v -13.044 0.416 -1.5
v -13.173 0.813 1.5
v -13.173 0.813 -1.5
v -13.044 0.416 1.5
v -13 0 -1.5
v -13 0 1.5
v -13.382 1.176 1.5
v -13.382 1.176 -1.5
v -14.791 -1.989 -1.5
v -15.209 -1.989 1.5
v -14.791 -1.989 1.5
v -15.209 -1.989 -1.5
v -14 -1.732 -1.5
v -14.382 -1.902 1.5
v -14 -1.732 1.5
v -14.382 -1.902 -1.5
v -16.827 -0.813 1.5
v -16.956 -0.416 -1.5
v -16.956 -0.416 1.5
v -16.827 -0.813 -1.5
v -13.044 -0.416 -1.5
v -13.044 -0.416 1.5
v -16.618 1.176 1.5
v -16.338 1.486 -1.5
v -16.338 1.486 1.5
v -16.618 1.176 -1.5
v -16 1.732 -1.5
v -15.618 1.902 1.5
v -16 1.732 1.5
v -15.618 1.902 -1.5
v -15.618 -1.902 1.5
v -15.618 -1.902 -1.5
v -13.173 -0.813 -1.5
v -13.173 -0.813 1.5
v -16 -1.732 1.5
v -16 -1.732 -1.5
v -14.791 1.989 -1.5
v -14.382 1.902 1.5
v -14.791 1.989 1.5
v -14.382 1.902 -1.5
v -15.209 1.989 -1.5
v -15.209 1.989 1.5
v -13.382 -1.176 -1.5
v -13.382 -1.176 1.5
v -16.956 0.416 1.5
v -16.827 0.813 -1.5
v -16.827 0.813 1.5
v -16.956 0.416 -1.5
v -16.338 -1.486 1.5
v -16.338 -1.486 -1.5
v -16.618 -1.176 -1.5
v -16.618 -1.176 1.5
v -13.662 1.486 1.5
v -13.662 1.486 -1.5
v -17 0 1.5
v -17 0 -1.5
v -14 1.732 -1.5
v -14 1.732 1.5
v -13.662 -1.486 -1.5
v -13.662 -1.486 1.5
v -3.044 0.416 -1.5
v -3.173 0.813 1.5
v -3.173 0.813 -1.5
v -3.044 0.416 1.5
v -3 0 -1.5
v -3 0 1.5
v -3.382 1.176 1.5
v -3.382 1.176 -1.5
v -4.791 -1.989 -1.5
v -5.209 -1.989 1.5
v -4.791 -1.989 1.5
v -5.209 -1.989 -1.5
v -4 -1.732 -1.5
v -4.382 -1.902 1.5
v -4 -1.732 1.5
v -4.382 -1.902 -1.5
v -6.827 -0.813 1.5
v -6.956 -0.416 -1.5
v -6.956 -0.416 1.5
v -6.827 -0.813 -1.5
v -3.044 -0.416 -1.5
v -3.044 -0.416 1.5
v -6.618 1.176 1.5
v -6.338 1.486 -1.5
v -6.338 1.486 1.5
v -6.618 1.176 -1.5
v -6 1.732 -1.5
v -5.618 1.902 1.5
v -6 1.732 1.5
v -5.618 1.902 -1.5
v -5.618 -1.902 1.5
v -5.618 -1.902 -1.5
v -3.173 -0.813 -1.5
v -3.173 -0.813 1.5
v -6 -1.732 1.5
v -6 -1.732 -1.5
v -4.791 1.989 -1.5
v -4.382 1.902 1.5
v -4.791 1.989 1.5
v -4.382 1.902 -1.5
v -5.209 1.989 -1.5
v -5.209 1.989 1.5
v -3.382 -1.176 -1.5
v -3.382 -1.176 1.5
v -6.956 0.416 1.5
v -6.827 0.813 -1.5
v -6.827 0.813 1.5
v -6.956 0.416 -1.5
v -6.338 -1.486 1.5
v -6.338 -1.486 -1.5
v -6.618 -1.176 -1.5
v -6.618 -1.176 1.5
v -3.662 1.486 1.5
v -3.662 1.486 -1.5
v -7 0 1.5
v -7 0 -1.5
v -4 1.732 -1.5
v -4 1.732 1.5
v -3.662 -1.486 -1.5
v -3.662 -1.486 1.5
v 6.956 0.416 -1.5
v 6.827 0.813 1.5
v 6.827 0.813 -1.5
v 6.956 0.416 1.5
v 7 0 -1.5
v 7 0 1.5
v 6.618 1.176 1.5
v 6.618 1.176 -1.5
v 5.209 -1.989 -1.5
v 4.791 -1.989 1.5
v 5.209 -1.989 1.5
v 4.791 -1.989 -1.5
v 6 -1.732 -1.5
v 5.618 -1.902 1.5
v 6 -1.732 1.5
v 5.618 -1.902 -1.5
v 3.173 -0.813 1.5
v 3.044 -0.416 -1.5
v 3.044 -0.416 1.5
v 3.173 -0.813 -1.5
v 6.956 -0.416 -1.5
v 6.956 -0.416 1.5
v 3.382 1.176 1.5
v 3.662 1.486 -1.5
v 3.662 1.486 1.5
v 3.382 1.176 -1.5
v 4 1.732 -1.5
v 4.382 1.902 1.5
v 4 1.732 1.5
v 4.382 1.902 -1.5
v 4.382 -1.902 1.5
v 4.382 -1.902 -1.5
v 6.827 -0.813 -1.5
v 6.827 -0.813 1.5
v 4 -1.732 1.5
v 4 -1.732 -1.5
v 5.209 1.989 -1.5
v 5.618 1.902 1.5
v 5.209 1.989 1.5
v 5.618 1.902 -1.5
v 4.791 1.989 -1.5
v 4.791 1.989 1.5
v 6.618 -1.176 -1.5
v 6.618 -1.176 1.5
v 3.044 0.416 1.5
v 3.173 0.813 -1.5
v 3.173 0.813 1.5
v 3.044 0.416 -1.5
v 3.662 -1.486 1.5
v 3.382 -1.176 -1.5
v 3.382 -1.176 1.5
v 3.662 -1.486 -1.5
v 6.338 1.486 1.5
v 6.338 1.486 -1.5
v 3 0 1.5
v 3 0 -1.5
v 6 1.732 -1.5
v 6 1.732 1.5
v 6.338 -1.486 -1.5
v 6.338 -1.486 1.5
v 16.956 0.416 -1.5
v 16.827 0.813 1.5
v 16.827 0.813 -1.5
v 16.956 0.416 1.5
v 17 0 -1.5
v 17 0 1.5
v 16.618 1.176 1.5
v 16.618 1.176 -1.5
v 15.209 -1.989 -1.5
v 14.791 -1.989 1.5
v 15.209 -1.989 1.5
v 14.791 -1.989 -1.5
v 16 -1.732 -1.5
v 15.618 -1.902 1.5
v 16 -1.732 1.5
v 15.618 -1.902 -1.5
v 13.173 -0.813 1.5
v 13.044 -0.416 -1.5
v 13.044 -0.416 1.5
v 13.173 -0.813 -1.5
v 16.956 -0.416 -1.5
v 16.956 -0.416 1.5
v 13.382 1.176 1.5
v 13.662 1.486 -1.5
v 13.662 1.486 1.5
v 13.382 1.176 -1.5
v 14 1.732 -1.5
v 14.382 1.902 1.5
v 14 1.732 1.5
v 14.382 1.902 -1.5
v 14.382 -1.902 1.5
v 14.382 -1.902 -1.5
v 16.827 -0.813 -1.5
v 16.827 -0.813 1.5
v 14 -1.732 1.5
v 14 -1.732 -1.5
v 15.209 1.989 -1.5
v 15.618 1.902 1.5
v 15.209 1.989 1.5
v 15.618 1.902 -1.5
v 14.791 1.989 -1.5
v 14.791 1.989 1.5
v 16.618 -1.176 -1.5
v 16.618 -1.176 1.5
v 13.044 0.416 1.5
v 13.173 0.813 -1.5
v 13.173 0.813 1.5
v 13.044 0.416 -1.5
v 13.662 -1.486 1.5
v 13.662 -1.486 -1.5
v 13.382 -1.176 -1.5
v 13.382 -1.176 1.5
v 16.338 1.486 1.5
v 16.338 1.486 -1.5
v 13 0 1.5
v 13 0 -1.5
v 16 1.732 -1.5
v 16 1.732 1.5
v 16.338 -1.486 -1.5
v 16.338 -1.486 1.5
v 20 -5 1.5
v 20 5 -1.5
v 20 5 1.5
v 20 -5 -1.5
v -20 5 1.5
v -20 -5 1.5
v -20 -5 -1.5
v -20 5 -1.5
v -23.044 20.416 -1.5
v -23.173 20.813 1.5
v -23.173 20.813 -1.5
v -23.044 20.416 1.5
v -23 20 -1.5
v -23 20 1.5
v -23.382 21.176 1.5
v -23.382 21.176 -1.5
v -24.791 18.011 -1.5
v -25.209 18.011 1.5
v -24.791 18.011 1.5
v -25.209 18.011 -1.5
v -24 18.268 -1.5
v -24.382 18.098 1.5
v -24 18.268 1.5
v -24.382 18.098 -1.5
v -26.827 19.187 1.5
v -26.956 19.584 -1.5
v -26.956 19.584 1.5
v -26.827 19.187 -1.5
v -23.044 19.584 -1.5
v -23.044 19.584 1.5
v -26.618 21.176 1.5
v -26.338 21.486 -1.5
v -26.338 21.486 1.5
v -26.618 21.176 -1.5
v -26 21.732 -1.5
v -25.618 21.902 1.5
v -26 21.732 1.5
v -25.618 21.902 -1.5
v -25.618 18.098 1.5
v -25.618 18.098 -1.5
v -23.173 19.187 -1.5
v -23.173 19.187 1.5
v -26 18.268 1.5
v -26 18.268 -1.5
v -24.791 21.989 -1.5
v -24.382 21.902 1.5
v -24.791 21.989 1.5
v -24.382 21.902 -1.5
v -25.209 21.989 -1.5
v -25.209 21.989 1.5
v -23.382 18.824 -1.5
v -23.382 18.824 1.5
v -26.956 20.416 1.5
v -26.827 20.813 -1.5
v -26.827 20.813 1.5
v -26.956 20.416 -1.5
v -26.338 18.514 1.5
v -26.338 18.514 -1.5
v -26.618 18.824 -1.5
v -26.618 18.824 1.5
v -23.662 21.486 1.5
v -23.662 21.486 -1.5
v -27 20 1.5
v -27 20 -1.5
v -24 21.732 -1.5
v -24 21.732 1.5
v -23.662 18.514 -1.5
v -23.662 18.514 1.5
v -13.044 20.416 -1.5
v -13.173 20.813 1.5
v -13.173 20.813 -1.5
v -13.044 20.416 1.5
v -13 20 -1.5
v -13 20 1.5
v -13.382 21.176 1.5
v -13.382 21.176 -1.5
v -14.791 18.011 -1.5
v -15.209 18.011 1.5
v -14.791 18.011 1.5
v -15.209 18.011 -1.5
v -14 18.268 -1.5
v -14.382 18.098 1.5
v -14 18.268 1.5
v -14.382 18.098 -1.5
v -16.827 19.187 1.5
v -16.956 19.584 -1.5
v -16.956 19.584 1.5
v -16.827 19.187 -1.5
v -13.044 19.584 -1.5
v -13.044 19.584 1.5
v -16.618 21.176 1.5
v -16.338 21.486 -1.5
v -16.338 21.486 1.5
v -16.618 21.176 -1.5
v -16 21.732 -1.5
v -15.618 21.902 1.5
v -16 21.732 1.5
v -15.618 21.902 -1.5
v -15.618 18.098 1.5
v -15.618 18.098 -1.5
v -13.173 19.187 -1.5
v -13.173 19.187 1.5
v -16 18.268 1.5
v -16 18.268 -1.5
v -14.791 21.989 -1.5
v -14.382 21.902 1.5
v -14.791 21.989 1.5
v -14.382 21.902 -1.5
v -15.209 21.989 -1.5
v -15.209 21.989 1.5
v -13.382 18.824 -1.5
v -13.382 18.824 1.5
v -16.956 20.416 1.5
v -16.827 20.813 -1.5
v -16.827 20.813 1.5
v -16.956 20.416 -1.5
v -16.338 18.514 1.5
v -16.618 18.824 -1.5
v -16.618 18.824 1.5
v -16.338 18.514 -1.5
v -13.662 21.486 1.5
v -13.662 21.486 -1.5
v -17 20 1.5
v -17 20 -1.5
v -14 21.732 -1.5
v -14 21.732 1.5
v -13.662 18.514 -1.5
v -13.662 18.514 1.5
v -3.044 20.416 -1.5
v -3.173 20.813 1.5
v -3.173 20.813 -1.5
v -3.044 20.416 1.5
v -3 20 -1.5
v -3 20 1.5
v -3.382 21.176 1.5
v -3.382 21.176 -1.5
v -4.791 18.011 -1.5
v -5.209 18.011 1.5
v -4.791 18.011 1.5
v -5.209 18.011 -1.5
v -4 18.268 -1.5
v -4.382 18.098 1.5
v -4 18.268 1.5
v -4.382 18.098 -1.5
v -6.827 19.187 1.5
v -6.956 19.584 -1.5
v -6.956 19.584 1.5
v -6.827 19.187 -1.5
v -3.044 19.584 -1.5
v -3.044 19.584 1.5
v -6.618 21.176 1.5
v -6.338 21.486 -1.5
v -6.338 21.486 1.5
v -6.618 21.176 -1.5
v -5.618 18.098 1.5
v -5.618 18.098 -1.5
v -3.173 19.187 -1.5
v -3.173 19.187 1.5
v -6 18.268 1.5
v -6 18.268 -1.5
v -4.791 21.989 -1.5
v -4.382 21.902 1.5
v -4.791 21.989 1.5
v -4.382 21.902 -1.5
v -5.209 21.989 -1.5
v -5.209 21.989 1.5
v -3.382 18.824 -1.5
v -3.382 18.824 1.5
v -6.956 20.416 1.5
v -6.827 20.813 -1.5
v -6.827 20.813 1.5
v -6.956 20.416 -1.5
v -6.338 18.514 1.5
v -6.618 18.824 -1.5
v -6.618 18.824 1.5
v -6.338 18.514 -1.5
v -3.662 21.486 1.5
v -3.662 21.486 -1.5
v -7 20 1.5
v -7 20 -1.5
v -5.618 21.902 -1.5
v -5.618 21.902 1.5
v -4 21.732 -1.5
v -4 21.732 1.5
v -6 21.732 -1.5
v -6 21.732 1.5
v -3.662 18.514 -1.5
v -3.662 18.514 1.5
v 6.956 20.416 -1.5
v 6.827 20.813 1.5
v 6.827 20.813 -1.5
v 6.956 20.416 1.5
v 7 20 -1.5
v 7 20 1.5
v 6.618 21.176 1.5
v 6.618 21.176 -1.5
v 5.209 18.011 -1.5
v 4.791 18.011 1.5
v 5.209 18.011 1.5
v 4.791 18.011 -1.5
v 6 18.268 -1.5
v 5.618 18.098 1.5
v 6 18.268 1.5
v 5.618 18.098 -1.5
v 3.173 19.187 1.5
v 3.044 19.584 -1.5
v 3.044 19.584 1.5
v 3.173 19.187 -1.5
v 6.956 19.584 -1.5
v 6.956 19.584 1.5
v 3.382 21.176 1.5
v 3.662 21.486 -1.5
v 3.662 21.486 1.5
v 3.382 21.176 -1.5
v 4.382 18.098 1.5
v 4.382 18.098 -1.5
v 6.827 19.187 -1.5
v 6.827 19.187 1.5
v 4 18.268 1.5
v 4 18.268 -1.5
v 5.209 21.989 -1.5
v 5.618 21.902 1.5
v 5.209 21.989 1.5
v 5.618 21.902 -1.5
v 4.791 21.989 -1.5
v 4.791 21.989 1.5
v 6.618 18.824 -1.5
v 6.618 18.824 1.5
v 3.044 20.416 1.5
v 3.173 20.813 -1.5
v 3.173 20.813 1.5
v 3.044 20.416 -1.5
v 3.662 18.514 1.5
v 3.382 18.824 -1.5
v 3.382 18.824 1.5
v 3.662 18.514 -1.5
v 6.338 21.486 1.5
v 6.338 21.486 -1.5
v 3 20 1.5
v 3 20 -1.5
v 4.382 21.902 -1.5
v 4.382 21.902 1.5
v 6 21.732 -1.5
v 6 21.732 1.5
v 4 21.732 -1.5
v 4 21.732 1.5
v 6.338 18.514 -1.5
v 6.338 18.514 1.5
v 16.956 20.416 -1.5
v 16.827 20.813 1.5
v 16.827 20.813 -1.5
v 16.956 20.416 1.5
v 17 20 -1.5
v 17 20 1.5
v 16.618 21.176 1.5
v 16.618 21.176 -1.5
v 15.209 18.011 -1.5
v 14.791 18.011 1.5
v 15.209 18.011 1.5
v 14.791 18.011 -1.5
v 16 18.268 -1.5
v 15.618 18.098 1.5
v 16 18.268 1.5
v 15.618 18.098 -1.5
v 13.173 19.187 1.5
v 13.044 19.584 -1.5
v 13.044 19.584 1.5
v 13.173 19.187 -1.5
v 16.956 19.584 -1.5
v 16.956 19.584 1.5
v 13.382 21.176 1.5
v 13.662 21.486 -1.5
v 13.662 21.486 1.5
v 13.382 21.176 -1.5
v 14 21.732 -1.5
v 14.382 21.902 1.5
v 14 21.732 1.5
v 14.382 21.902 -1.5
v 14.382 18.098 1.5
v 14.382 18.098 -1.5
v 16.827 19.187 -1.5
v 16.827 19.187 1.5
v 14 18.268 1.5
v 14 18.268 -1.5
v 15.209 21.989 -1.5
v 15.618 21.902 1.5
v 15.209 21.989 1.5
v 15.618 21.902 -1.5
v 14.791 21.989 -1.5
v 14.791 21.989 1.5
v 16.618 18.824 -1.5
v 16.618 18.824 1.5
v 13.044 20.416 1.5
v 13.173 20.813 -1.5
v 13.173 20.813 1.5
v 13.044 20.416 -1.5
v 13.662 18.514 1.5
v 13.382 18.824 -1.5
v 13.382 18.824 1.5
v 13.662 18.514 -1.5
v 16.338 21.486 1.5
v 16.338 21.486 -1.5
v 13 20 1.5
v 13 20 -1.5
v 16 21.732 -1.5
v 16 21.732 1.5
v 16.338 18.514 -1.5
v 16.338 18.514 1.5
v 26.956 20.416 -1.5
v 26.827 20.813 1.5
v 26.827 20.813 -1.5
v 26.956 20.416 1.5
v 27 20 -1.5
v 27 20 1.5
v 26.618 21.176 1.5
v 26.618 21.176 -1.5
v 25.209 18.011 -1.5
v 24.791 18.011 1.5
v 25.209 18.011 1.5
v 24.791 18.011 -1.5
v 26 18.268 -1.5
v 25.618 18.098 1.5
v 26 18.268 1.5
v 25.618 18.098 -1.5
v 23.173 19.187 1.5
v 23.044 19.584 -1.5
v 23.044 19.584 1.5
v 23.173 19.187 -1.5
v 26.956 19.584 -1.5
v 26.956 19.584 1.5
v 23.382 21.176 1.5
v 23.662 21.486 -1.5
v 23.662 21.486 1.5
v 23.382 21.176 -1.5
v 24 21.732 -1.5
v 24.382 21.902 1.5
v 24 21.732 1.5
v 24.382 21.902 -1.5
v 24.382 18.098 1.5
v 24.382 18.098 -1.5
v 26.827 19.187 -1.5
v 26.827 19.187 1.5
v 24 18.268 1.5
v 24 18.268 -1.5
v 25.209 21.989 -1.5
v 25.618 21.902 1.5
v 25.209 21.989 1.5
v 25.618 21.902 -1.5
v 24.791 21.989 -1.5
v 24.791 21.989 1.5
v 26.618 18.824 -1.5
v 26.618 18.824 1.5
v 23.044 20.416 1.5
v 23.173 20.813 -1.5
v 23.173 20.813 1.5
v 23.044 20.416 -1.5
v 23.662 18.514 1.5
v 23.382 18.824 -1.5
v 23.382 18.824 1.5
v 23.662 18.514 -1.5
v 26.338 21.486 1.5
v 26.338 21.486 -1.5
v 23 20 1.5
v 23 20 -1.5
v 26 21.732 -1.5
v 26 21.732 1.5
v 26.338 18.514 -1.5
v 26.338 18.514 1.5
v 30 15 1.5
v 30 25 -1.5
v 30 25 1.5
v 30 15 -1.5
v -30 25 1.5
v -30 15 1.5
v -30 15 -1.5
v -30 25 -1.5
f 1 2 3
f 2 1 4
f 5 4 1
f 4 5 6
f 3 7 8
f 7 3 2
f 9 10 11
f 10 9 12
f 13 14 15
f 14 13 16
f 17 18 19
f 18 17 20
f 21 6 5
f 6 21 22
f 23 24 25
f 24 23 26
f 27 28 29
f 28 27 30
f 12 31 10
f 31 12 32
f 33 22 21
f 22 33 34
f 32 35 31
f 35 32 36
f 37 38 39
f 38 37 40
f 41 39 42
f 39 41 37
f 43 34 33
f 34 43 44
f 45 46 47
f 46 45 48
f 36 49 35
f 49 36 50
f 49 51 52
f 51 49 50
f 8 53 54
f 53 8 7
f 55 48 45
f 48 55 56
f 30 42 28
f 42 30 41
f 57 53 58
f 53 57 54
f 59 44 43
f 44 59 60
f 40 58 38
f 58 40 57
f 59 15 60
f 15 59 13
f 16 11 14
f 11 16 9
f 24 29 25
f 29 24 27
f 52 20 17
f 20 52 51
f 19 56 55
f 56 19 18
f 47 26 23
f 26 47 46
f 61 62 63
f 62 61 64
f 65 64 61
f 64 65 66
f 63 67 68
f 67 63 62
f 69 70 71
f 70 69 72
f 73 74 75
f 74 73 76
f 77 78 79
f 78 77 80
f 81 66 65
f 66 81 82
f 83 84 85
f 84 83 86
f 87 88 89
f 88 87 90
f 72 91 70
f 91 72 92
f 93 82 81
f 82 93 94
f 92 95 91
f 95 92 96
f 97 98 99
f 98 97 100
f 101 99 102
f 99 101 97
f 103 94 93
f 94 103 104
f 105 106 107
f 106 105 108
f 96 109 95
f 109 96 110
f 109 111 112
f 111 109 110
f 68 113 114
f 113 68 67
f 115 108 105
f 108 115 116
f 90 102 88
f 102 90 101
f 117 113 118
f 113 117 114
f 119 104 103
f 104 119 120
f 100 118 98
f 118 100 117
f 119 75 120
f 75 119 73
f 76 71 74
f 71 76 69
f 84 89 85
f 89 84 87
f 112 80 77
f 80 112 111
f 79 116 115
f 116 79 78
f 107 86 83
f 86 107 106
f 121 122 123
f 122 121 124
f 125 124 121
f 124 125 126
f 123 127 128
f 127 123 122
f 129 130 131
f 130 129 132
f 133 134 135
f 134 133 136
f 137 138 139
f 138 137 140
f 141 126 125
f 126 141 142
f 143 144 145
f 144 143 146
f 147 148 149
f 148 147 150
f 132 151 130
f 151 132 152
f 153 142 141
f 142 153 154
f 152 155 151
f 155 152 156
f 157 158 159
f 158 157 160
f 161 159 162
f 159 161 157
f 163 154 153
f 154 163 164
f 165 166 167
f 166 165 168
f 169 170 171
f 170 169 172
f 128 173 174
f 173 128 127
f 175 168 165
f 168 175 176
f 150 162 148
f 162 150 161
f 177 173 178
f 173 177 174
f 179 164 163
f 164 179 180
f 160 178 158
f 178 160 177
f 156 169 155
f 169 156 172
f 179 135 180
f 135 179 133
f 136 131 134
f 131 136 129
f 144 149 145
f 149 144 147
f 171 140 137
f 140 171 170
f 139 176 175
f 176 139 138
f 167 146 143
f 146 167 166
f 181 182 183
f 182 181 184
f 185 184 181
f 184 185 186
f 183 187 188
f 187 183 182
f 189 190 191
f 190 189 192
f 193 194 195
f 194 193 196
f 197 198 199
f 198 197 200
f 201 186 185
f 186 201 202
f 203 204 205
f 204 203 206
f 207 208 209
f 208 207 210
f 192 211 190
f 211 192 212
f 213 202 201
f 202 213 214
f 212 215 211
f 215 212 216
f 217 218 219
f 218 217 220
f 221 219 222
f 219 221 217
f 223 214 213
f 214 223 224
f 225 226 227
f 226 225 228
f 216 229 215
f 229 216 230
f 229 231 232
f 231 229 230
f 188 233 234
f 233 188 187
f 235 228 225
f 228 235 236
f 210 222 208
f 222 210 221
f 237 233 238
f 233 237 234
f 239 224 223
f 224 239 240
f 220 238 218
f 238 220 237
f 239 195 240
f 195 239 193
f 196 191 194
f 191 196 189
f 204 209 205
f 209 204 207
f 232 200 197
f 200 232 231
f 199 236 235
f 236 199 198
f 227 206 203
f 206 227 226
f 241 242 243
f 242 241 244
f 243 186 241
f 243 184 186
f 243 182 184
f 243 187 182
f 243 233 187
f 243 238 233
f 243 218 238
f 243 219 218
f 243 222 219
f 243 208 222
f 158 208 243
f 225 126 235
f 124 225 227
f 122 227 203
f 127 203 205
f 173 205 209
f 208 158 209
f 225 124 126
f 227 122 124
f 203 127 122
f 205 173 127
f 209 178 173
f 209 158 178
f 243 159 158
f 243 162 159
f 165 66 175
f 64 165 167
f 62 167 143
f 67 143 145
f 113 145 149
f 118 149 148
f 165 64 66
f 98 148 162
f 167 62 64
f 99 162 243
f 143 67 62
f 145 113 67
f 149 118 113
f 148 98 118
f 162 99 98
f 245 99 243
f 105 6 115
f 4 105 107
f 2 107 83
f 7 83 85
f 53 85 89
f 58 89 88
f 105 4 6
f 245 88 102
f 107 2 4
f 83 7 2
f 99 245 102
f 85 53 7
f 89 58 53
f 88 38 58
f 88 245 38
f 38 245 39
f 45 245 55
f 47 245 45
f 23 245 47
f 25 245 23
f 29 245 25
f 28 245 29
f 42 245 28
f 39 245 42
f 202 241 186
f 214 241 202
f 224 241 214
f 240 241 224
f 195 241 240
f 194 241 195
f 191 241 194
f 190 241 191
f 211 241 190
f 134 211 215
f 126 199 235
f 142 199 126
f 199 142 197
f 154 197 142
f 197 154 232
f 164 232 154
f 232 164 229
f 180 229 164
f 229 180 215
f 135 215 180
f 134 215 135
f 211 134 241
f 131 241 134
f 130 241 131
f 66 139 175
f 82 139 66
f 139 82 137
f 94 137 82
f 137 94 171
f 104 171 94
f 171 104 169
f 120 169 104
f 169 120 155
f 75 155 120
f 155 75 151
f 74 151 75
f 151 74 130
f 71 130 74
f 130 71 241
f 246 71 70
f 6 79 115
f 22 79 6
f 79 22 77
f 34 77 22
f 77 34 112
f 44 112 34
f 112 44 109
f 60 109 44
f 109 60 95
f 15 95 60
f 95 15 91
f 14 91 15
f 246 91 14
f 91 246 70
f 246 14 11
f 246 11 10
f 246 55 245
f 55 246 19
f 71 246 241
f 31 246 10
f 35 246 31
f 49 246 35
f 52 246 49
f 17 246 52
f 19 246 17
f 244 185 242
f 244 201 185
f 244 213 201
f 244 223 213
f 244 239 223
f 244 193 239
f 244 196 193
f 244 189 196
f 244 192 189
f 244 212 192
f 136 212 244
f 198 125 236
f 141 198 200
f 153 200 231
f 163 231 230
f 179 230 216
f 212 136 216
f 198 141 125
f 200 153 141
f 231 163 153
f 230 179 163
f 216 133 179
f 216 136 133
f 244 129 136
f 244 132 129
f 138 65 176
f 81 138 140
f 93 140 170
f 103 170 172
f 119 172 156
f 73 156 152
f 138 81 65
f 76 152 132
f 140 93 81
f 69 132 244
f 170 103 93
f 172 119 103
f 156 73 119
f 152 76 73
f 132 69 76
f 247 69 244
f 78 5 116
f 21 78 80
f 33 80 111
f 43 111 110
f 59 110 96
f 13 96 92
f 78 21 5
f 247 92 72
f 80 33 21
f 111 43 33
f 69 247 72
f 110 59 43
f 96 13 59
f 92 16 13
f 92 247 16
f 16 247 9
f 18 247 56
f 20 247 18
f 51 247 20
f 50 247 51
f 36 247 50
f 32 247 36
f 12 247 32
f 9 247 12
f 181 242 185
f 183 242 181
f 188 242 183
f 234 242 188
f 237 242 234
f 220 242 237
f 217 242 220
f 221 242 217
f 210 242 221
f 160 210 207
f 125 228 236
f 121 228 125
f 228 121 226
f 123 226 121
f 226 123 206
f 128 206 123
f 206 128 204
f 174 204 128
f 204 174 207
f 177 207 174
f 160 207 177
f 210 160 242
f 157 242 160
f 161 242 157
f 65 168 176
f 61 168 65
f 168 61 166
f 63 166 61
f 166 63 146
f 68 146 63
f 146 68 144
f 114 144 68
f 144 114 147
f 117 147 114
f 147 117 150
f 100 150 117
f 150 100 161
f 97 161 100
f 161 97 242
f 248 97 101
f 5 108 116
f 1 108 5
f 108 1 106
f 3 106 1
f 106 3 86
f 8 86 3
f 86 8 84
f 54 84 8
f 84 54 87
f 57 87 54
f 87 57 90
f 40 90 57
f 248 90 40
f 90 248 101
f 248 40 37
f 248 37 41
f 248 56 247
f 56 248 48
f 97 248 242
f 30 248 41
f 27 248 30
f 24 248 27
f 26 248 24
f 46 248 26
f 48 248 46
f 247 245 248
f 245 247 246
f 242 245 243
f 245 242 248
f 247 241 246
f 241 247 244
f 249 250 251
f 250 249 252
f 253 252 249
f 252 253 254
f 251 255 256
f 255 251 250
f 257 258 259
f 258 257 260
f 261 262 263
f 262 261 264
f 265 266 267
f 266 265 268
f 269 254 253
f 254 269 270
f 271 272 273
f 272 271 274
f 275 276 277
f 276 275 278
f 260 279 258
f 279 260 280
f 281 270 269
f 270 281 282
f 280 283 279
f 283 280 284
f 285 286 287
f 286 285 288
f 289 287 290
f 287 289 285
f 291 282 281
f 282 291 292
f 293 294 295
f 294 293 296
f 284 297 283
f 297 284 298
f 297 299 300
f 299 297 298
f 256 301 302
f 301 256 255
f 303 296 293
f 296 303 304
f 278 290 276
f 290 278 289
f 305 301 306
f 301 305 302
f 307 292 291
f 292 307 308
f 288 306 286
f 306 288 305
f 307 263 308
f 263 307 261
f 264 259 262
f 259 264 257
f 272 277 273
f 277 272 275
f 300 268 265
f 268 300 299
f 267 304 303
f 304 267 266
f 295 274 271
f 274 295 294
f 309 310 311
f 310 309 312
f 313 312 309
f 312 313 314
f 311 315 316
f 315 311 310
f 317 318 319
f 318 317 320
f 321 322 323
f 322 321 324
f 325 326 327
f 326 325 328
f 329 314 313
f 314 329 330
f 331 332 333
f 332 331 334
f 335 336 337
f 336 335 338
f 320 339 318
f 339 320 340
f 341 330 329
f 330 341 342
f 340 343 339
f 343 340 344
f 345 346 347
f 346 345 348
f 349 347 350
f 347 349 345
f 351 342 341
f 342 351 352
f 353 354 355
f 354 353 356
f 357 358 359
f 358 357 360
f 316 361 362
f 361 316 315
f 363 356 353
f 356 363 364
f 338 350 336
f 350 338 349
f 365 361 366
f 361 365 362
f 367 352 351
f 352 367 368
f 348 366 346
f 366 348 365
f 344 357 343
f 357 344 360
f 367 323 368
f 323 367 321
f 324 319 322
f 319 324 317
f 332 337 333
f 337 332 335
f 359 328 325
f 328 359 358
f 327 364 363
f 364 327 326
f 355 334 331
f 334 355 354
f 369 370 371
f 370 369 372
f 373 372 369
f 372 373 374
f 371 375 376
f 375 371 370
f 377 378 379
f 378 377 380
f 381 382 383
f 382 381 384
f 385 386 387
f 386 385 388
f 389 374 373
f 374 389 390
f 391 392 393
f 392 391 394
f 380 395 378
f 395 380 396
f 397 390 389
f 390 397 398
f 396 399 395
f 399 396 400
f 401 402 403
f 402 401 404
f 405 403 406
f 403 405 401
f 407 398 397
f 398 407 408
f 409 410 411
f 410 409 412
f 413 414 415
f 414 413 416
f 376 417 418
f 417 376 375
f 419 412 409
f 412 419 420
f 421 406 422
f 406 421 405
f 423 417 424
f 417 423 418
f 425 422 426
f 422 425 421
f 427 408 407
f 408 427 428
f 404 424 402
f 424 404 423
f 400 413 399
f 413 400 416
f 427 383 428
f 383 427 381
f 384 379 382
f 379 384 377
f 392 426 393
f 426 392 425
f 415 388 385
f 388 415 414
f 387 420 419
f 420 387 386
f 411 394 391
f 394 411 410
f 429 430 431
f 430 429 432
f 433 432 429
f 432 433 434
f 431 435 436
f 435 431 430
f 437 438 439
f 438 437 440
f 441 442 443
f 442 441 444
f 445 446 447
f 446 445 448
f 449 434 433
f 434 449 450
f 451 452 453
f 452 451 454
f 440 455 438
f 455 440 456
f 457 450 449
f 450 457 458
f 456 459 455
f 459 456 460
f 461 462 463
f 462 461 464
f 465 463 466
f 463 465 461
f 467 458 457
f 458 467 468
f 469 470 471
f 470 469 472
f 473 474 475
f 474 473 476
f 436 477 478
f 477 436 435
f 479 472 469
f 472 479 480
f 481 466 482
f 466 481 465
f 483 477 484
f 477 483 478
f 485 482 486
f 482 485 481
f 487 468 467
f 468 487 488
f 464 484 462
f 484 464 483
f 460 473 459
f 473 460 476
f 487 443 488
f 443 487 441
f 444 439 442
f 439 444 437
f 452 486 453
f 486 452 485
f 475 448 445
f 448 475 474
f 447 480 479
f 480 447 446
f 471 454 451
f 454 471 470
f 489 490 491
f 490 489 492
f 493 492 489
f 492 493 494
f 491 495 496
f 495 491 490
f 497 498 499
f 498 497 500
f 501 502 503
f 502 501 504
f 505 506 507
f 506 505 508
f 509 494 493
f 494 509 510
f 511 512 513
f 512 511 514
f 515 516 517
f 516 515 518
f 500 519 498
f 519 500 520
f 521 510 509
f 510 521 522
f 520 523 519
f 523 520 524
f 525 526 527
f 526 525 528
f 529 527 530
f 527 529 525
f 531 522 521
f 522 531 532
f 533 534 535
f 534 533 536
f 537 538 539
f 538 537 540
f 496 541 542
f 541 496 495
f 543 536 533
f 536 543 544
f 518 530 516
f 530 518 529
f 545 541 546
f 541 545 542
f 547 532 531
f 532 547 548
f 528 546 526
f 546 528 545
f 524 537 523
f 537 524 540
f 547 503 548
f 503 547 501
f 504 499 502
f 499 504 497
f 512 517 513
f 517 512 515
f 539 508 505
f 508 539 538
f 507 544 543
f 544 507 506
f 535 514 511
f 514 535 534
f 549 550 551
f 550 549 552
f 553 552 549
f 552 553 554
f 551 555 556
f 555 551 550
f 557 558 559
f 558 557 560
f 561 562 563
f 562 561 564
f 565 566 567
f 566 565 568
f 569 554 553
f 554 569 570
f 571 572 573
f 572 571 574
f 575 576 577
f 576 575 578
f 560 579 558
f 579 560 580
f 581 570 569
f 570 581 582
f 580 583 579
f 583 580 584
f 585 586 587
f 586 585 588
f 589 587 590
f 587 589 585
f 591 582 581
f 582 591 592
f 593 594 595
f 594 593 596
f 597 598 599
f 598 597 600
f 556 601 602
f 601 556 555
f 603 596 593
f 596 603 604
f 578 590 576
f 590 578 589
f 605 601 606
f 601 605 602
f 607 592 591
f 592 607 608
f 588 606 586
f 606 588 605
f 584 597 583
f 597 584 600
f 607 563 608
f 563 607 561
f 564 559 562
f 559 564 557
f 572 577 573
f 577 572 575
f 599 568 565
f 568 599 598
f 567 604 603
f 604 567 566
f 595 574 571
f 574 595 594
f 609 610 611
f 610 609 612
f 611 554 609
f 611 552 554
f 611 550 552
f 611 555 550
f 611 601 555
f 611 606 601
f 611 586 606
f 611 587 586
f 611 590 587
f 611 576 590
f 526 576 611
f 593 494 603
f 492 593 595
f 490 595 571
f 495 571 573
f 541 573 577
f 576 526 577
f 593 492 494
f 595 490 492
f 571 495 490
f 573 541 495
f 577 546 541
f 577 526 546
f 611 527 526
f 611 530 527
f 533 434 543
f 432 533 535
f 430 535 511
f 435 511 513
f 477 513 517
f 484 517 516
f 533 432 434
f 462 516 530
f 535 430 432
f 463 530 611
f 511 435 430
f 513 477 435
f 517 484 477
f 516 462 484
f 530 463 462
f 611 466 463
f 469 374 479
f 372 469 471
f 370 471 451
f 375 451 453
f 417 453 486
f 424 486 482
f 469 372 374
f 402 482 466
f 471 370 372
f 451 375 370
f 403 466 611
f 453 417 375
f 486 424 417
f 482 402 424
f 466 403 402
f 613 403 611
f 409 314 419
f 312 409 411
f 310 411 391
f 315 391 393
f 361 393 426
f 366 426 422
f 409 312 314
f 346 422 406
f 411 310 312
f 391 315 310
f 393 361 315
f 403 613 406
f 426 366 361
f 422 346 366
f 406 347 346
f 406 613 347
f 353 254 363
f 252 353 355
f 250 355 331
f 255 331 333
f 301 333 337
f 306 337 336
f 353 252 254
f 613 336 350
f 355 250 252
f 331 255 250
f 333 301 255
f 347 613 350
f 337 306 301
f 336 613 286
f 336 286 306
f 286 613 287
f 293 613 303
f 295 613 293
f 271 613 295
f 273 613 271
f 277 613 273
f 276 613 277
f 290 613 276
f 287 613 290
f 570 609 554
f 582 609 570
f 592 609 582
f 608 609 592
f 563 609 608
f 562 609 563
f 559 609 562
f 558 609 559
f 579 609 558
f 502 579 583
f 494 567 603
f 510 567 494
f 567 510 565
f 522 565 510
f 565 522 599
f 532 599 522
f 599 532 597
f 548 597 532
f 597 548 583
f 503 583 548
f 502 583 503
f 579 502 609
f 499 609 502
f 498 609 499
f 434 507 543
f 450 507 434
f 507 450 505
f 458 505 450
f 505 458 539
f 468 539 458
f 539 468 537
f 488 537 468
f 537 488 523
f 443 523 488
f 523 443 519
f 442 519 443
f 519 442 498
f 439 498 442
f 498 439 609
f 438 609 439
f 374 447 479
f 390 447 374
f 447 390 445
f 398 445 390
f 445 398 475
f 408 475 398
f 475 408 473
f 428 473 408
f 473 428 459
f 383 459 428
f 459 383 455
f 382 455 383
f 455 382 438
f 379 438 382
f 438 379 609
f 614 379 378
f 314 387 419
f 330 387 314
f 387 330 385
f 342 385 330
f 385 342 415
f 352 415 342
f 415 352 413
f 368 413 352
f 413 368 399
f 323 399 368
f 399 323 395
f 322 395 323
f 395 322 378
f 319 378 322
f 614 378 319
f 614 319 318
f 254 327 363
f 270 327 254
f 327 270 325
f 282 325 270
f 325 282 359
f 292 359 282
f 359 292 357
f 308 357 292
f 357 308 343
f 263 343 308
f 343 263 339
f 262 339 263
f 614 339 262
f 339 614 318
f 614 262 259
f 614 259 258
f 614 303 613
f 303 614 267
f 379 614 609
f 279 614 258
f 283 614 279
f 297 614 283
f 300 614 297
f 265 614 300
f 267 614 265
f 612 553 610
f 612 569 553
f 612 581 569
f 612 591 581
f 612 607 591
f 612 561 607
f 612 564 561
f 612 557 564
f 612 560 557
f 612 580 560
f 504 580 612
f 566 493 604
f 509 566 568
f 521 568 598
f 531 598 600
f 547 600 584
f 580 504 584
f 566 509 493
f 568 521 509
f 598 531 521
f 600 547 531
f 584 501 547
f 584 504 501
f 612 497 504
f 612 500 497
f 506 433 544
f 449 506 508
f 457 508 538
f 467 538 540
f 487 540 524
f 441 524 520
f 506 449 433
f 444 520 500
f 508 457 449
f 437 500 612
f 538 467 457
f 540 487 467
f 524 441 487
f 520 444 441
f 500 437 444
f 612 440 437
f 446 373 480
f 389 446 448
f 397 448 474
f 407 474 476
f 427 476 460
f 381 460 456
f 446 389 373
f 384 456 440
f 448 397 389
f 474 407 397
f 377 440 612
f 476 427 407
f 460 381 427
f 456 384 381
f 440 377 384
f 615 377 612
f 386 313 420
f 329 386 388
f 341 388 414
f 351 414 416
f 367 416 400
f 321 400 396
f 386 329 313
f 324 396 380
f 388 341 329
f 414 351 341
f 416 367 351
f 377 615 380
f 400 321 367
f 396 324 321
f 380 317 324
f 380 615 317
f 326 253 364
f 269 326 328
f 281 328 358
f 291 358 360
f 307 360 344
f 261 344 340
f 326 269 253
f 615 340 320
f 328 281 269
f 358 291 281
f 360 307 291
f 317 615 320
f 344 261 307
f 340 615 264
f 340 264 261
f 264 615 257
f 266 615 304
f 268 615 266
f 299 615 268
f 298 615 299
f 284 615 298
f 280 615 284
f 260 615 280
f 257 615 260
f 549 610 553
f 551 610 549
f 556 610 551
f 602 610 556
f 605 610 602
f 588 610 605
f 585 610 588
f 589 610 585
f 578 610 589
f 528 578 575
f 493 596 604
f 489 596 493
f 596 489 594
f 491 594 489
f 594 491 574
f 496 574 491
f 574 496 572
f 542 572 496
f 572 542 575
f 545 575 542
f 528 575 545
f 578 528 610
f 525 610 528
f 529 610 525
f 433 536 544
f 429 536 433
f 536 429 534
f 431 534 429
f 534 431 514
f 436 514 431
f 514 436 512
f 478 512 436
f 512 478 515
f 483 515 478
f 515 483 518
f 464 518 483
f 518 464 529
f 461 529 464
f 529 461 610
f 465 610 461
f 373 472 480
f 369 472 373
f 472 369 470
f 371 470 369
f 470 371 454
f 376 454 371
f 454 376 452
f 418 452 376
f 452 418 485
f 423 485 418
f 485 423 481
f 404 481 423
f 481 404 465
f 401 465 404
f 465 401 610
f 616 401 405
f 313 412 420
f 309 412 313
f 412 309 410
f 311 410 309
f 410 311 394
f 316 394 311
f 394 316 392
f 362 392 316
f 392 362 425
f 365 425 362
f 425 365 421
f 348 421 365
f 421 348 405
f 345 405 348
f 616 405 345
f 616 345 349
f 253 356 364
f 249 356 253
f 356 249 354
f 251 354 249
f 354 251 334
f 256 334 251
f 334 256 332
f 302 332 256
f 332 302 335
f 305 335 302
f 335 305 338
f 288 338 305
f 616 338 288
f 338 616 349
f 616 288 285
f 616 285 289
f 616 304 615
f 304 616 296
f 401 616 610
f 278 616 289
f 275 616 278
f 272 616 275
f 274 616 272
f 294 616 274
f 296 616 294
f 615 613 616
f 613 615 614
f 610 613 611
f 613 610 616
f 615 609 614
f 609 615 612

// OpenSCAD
// En este ejemplo convertiremos en un módulo la pieza de mecano anterior

// Ejemplo de una pieza de mecano paramétrico
//---------------------------------------------
// Definición del tamaño de taladro
//drill=4;
//d=10;
//n=10;    // Núnmero de agujeros
// Definición tamaño pieza
//anchura = 10;
//grosor = 3;

module pieza_mecano(drill=4, d=10, anchura=10, grosor=3){
    lx = n*d;
    // Dibujamos la figura
    translate([-lx/2, 0, 0])    // Centramos en el eje de coordenadas
    difference(){
        // Definimos la figura
        translate([lx/2, 0, 0])
        cube([lx, anchura, grosor], center = true);
        // Repetimos los taladros a lo largo de la figura
        for(i=[0:n-1]){
            translate([d*i+d/2,0, 0])
            cylinder(r=drill/2, h=grosor*2, $fn=30, center = true);
            }
    }
}


// Ejemplo de uso del módulo
pieza_mecano(n=4);

translate([0, 20, 0])
pieza_mecano(n=6);
